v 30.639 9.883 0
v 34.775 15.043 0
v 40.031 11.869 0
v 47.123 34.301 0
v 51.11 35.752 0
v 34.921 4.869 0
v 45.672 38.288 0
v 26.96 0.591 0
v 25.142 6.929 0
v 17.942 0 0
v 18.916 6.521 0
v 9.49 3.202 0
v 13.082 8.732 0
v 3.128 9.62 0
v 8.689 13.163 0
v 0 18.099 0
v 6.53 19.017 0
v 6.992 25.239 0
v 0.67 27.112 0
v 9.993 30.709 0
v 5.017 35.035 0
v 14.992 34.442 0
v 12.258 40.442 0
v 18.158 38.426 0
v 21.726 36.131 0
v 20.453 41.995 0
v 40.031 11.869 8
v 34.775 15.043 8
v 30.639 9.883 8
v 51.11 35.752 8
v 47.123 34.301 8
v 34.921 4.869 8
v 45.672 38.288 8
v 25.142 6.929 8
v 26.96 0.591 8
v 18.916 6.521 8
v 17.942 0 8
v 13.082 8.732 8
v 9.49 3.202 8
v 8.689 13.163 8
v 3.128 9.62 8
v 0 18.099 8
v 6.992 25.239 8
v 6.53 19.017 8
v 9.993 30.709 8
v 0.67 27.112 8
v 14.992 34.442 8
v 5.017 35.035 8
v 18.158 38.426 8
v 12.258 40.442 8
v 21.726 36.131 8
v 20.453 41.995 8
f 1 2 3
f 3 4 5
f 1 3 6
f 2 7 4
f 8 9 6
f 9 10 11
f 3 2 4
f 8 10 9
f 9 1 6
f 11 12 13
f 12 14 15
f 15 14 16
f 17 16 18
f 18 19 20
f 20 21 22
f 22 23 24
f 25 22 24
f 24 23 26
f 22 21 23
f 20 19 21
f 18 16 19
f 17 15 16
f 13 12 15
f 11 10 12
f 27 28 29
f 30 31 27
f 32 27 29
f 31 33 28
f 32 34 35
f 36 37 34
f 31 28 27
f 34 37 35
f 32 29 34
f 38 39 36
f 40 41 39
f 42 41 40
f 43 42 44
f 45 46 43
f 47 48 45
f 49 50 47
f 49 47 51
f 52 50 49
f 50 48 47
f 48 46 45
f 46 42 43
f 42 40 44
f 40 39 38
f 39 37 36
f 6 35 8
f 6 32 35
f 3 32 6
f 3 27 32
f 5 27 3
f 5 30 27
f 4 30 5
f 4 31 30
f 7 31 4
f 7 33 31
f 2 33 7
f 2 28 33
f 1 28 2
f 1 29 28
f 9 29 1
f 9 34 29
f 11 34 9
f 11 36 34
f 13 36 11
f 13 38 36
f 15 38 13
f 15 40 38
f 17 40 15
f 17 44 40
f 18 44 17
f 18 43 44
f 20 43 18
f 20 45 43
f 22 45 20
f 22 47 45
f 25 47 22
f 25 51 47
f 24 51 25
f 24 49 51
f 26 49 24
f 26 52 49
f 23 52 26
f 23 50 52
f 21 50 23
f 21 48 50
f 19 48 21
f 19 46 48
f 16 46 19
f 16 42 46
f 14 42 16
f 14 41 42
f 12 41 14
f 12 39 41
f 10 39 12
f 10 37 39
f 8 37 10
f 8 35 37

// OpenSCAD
$fn = 32;

// ----------------------------------------------------------------------
// Hook plate: curl radius 18 mm over 245 degrees, 6 mm thick band
// ----------------------------------------------------------------------

// --- parameters (mm) ---
profile_height = 8;       // extrusion height
profile_points = 26;      // points of the closed outline

profile = [[18.158, 38.426], [20.453, 41.995], [12.258, 40.442], [5.017, 35.035], [0.67, 27.112], [0, 18.099], [3.128, 9.62], [9.49, 3.202], [17.942, 0], [26.96, 0.591], [34.921, 4.869], [40.031, 11.869], [51.11, 35.752], [47.123, 34.301], [45.672, 38.288], [34.775, 15.043], [30.639, 9.883], [25.142, 6.929], [18.916, 6.521], [13.082, 8.732], [8.689, 13.163], [6.53, 19.017], [6.992, 25.239], [9.993, 30.709], [14.992, 34.442], [21.726, 36.131]];  // single closed polygon, 26 points, counter clockwise

// --- the one profile operation ---
linear_extrude(height = profile_height) polygon(points = profile);
